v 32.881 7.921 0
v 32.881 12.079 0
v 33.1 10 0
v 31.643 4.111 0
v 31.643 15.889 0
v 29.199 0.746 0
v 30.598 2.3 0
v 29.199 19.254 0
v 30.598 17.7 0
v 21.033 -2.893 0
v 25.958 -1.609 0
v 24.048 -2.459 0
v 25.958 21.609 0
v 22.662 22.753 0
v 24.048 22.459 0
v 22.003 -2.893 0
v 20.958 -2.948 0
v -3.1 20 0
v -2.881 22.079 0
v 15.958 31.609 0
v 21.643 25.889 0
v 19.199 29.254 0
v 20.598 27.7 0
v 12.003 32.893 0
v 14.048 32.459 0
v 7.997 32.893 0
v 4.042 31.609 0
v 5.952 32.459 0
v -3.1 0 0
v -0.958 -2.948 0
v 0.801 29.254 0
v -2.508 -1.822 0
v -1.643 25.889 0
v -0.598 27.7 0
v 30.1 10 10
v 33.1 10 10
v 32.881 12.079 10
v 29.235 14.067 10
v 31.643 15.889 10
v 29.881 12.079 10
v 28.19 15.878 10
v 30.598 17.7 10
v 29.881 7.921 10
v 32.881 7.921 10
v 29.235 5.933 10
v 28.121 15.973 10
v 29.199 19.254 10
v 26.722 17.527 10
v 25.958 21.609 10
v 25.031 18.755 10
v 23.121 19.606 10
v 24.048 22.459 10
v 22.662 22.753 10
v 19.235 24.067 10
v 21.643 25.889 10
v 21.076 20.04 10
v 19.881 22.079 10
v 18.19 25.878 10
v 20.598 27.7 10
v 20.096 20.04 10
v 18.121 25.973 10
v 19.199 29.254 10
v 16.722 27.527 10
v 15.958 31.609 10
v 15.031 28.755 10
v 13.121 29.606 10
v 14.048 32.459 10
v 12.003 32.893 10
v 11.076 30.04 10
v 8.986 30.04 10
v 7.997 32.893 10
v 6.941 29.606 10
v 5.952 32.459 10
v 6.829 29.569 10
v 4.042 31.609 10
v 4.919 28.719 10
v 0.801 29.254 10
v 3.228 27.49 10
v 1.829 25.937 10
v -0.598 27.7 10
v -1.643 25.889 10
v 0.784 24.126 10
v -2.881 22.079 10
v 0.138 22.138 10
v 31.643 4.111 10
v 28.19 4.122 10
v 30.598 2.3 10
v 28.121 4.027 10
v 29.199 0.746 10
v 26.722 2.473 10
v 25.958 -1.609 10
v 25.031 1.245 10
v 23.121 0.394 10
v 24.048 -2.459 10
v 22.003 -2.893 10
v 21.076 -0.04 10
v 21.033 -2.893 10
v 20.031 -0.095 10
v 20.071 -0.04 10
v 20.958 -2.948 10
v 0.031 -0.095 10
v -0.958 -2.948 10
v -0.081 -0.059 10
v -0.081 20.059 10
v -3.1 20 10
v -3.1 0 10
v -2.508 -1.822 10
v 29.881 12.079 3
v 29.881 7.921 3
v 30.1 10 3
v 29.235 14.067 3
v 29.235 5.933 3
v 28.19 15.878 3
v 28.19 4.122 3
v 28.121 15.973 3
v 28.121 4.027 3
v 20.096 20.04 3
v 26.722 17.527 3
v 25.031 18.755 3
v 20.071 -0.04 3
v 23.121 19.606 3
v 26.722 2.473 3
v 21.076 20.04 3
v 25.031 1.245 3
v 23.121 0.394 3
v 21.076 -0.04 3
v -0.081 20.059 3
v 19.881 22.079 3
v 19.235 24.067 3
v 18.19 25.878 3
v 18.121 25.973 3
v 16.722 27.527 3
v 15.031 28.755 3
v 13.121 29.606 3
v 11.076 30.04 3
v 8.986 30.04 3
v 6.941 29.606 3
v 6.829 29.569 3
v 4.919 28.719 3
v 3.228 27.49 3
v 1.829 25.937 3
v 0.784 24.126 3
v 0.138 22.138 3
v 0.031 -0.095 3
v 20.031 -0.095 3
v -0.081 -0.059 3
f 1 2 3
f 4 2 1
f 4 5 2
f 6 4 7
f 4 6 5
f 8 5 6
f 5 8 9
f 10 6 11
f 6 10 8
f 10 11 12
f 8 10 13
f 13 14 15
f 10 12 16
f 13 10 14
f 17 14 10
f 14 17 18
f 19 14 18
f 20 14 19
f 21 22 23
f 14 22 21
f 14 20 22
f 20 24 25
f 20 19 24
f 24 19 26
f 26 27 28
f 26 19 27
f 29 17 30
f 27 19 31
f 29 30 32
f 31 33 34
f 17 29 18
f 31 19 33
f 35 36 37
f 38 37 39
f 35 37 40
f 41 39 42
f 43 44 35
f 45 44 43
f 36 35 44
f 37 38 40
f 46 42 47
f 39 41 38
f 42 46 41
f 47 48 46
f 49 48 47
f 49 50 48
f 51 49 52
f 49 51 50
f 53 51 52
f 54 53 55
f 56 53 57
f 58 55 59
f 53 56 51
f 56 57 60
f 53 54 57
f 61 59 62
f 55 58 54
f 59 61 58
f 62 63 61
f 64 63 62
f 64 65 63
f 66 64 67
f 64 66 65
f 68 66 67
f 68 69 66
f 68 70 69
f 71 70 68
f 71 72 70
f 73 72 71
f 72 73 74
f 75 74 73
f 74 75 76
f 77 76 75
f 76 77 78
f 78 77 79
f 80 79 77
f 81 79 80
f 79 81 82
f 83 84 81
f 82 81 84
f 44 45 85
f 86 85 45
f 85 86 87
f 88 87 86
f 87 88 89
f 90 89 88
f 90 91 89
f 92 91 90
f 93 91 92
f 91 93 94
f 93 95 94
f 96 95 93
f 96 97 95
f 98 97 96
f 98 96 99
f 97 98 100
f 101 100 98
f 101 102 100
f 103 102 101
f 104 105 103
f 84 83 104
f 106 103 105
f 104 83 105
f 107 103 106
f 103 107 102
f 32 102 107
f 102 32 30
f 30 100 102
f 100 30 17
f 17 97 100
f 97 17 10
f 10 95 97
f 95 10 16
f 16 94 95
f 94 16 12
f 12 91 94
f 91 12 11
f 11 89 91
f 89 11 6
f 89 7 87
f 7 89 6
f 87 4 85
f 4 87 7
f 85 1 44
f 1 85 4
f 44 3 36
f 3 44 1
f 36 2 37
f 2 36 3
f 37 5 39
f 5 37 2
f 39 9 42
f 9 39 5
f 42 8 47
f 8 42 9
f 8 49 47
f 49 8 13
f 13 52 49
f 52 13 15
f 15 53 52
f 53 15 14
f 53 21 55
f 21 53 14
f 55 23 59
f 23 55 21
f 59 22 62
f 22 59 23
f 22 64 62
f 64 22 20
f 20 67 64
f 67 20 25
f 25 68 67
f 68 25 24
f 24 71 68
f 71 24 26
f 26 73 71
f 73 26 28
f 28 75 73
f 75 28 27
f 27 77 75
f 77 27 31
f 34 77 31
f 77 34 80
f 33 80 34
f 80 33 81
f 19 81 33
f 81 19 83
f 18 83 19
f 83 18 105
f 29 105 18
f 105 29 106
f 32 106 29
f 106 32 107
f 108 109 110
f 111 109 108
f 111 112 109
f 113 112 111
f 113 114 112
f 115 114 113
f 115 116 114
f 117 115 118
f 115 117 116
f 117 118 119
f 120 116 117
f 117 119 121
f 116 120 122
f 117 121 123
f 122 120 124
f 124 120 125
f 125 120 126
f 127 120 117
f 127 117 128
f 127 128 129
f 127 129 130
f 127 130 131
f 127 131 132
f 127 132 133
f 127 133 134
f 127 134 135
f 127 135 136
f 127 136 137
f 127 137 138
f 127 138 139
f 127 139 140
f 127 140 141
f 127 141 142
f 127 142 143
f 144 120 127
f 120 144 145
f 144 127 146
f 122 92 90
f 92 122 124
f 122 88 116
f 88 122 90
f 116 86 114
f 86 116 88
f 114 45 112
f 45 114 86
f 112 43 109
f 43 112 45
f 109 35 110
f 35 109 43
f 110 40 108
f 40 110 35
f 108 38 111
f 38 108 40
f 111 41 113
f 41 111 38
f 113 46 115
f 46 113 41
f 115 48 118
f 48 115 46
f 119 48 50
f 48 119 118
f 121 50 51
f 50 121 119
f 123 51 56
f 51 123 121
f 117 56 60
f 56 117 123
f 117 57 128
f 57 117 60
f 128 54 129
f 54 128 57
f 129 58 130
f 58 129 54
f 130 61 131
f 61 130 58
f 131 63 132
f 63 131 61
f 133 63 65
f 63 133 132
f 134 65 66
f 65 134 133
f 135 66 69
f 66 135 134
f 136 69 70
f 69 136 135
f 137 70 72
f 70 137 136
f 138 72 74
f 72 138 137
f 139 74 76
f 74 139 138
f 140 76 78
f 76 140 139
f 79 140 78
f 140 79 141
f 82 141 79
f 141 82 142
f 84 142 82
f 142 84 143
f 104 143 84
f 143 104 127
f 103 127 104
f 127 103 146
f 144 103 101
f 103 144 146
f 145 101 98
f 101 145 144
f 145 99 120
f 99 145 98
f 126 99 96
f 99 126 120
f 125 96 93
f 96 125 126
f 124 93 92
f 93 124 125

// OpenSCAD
// [FL_INDEX: keywords="openscad, 3d_parametric, boxheart, csg_solid" | COT="Parametric OpenSCAD design from 3DCodeverse"]
// Title: boxheart

module heart_shape(size) {
     union() {
        square(size,size);
        translate([size/2,size,0]) circle(size/2);
        translate([size,size/2,0]) circle(size/2);
    }
}

module heart(size,thickness,height) {
   linear_extrude(height=height)
          minkowski() {
               heart_shape(size);
               circle(thickness+0.1);
        }
}

module heart_box(size,height,thickness) {
    difference() {
         heart(size,thickness,height);
         translate([0,0,thickness]) heart(size,0,height);
    }
}

heart_box(20,10,3);
